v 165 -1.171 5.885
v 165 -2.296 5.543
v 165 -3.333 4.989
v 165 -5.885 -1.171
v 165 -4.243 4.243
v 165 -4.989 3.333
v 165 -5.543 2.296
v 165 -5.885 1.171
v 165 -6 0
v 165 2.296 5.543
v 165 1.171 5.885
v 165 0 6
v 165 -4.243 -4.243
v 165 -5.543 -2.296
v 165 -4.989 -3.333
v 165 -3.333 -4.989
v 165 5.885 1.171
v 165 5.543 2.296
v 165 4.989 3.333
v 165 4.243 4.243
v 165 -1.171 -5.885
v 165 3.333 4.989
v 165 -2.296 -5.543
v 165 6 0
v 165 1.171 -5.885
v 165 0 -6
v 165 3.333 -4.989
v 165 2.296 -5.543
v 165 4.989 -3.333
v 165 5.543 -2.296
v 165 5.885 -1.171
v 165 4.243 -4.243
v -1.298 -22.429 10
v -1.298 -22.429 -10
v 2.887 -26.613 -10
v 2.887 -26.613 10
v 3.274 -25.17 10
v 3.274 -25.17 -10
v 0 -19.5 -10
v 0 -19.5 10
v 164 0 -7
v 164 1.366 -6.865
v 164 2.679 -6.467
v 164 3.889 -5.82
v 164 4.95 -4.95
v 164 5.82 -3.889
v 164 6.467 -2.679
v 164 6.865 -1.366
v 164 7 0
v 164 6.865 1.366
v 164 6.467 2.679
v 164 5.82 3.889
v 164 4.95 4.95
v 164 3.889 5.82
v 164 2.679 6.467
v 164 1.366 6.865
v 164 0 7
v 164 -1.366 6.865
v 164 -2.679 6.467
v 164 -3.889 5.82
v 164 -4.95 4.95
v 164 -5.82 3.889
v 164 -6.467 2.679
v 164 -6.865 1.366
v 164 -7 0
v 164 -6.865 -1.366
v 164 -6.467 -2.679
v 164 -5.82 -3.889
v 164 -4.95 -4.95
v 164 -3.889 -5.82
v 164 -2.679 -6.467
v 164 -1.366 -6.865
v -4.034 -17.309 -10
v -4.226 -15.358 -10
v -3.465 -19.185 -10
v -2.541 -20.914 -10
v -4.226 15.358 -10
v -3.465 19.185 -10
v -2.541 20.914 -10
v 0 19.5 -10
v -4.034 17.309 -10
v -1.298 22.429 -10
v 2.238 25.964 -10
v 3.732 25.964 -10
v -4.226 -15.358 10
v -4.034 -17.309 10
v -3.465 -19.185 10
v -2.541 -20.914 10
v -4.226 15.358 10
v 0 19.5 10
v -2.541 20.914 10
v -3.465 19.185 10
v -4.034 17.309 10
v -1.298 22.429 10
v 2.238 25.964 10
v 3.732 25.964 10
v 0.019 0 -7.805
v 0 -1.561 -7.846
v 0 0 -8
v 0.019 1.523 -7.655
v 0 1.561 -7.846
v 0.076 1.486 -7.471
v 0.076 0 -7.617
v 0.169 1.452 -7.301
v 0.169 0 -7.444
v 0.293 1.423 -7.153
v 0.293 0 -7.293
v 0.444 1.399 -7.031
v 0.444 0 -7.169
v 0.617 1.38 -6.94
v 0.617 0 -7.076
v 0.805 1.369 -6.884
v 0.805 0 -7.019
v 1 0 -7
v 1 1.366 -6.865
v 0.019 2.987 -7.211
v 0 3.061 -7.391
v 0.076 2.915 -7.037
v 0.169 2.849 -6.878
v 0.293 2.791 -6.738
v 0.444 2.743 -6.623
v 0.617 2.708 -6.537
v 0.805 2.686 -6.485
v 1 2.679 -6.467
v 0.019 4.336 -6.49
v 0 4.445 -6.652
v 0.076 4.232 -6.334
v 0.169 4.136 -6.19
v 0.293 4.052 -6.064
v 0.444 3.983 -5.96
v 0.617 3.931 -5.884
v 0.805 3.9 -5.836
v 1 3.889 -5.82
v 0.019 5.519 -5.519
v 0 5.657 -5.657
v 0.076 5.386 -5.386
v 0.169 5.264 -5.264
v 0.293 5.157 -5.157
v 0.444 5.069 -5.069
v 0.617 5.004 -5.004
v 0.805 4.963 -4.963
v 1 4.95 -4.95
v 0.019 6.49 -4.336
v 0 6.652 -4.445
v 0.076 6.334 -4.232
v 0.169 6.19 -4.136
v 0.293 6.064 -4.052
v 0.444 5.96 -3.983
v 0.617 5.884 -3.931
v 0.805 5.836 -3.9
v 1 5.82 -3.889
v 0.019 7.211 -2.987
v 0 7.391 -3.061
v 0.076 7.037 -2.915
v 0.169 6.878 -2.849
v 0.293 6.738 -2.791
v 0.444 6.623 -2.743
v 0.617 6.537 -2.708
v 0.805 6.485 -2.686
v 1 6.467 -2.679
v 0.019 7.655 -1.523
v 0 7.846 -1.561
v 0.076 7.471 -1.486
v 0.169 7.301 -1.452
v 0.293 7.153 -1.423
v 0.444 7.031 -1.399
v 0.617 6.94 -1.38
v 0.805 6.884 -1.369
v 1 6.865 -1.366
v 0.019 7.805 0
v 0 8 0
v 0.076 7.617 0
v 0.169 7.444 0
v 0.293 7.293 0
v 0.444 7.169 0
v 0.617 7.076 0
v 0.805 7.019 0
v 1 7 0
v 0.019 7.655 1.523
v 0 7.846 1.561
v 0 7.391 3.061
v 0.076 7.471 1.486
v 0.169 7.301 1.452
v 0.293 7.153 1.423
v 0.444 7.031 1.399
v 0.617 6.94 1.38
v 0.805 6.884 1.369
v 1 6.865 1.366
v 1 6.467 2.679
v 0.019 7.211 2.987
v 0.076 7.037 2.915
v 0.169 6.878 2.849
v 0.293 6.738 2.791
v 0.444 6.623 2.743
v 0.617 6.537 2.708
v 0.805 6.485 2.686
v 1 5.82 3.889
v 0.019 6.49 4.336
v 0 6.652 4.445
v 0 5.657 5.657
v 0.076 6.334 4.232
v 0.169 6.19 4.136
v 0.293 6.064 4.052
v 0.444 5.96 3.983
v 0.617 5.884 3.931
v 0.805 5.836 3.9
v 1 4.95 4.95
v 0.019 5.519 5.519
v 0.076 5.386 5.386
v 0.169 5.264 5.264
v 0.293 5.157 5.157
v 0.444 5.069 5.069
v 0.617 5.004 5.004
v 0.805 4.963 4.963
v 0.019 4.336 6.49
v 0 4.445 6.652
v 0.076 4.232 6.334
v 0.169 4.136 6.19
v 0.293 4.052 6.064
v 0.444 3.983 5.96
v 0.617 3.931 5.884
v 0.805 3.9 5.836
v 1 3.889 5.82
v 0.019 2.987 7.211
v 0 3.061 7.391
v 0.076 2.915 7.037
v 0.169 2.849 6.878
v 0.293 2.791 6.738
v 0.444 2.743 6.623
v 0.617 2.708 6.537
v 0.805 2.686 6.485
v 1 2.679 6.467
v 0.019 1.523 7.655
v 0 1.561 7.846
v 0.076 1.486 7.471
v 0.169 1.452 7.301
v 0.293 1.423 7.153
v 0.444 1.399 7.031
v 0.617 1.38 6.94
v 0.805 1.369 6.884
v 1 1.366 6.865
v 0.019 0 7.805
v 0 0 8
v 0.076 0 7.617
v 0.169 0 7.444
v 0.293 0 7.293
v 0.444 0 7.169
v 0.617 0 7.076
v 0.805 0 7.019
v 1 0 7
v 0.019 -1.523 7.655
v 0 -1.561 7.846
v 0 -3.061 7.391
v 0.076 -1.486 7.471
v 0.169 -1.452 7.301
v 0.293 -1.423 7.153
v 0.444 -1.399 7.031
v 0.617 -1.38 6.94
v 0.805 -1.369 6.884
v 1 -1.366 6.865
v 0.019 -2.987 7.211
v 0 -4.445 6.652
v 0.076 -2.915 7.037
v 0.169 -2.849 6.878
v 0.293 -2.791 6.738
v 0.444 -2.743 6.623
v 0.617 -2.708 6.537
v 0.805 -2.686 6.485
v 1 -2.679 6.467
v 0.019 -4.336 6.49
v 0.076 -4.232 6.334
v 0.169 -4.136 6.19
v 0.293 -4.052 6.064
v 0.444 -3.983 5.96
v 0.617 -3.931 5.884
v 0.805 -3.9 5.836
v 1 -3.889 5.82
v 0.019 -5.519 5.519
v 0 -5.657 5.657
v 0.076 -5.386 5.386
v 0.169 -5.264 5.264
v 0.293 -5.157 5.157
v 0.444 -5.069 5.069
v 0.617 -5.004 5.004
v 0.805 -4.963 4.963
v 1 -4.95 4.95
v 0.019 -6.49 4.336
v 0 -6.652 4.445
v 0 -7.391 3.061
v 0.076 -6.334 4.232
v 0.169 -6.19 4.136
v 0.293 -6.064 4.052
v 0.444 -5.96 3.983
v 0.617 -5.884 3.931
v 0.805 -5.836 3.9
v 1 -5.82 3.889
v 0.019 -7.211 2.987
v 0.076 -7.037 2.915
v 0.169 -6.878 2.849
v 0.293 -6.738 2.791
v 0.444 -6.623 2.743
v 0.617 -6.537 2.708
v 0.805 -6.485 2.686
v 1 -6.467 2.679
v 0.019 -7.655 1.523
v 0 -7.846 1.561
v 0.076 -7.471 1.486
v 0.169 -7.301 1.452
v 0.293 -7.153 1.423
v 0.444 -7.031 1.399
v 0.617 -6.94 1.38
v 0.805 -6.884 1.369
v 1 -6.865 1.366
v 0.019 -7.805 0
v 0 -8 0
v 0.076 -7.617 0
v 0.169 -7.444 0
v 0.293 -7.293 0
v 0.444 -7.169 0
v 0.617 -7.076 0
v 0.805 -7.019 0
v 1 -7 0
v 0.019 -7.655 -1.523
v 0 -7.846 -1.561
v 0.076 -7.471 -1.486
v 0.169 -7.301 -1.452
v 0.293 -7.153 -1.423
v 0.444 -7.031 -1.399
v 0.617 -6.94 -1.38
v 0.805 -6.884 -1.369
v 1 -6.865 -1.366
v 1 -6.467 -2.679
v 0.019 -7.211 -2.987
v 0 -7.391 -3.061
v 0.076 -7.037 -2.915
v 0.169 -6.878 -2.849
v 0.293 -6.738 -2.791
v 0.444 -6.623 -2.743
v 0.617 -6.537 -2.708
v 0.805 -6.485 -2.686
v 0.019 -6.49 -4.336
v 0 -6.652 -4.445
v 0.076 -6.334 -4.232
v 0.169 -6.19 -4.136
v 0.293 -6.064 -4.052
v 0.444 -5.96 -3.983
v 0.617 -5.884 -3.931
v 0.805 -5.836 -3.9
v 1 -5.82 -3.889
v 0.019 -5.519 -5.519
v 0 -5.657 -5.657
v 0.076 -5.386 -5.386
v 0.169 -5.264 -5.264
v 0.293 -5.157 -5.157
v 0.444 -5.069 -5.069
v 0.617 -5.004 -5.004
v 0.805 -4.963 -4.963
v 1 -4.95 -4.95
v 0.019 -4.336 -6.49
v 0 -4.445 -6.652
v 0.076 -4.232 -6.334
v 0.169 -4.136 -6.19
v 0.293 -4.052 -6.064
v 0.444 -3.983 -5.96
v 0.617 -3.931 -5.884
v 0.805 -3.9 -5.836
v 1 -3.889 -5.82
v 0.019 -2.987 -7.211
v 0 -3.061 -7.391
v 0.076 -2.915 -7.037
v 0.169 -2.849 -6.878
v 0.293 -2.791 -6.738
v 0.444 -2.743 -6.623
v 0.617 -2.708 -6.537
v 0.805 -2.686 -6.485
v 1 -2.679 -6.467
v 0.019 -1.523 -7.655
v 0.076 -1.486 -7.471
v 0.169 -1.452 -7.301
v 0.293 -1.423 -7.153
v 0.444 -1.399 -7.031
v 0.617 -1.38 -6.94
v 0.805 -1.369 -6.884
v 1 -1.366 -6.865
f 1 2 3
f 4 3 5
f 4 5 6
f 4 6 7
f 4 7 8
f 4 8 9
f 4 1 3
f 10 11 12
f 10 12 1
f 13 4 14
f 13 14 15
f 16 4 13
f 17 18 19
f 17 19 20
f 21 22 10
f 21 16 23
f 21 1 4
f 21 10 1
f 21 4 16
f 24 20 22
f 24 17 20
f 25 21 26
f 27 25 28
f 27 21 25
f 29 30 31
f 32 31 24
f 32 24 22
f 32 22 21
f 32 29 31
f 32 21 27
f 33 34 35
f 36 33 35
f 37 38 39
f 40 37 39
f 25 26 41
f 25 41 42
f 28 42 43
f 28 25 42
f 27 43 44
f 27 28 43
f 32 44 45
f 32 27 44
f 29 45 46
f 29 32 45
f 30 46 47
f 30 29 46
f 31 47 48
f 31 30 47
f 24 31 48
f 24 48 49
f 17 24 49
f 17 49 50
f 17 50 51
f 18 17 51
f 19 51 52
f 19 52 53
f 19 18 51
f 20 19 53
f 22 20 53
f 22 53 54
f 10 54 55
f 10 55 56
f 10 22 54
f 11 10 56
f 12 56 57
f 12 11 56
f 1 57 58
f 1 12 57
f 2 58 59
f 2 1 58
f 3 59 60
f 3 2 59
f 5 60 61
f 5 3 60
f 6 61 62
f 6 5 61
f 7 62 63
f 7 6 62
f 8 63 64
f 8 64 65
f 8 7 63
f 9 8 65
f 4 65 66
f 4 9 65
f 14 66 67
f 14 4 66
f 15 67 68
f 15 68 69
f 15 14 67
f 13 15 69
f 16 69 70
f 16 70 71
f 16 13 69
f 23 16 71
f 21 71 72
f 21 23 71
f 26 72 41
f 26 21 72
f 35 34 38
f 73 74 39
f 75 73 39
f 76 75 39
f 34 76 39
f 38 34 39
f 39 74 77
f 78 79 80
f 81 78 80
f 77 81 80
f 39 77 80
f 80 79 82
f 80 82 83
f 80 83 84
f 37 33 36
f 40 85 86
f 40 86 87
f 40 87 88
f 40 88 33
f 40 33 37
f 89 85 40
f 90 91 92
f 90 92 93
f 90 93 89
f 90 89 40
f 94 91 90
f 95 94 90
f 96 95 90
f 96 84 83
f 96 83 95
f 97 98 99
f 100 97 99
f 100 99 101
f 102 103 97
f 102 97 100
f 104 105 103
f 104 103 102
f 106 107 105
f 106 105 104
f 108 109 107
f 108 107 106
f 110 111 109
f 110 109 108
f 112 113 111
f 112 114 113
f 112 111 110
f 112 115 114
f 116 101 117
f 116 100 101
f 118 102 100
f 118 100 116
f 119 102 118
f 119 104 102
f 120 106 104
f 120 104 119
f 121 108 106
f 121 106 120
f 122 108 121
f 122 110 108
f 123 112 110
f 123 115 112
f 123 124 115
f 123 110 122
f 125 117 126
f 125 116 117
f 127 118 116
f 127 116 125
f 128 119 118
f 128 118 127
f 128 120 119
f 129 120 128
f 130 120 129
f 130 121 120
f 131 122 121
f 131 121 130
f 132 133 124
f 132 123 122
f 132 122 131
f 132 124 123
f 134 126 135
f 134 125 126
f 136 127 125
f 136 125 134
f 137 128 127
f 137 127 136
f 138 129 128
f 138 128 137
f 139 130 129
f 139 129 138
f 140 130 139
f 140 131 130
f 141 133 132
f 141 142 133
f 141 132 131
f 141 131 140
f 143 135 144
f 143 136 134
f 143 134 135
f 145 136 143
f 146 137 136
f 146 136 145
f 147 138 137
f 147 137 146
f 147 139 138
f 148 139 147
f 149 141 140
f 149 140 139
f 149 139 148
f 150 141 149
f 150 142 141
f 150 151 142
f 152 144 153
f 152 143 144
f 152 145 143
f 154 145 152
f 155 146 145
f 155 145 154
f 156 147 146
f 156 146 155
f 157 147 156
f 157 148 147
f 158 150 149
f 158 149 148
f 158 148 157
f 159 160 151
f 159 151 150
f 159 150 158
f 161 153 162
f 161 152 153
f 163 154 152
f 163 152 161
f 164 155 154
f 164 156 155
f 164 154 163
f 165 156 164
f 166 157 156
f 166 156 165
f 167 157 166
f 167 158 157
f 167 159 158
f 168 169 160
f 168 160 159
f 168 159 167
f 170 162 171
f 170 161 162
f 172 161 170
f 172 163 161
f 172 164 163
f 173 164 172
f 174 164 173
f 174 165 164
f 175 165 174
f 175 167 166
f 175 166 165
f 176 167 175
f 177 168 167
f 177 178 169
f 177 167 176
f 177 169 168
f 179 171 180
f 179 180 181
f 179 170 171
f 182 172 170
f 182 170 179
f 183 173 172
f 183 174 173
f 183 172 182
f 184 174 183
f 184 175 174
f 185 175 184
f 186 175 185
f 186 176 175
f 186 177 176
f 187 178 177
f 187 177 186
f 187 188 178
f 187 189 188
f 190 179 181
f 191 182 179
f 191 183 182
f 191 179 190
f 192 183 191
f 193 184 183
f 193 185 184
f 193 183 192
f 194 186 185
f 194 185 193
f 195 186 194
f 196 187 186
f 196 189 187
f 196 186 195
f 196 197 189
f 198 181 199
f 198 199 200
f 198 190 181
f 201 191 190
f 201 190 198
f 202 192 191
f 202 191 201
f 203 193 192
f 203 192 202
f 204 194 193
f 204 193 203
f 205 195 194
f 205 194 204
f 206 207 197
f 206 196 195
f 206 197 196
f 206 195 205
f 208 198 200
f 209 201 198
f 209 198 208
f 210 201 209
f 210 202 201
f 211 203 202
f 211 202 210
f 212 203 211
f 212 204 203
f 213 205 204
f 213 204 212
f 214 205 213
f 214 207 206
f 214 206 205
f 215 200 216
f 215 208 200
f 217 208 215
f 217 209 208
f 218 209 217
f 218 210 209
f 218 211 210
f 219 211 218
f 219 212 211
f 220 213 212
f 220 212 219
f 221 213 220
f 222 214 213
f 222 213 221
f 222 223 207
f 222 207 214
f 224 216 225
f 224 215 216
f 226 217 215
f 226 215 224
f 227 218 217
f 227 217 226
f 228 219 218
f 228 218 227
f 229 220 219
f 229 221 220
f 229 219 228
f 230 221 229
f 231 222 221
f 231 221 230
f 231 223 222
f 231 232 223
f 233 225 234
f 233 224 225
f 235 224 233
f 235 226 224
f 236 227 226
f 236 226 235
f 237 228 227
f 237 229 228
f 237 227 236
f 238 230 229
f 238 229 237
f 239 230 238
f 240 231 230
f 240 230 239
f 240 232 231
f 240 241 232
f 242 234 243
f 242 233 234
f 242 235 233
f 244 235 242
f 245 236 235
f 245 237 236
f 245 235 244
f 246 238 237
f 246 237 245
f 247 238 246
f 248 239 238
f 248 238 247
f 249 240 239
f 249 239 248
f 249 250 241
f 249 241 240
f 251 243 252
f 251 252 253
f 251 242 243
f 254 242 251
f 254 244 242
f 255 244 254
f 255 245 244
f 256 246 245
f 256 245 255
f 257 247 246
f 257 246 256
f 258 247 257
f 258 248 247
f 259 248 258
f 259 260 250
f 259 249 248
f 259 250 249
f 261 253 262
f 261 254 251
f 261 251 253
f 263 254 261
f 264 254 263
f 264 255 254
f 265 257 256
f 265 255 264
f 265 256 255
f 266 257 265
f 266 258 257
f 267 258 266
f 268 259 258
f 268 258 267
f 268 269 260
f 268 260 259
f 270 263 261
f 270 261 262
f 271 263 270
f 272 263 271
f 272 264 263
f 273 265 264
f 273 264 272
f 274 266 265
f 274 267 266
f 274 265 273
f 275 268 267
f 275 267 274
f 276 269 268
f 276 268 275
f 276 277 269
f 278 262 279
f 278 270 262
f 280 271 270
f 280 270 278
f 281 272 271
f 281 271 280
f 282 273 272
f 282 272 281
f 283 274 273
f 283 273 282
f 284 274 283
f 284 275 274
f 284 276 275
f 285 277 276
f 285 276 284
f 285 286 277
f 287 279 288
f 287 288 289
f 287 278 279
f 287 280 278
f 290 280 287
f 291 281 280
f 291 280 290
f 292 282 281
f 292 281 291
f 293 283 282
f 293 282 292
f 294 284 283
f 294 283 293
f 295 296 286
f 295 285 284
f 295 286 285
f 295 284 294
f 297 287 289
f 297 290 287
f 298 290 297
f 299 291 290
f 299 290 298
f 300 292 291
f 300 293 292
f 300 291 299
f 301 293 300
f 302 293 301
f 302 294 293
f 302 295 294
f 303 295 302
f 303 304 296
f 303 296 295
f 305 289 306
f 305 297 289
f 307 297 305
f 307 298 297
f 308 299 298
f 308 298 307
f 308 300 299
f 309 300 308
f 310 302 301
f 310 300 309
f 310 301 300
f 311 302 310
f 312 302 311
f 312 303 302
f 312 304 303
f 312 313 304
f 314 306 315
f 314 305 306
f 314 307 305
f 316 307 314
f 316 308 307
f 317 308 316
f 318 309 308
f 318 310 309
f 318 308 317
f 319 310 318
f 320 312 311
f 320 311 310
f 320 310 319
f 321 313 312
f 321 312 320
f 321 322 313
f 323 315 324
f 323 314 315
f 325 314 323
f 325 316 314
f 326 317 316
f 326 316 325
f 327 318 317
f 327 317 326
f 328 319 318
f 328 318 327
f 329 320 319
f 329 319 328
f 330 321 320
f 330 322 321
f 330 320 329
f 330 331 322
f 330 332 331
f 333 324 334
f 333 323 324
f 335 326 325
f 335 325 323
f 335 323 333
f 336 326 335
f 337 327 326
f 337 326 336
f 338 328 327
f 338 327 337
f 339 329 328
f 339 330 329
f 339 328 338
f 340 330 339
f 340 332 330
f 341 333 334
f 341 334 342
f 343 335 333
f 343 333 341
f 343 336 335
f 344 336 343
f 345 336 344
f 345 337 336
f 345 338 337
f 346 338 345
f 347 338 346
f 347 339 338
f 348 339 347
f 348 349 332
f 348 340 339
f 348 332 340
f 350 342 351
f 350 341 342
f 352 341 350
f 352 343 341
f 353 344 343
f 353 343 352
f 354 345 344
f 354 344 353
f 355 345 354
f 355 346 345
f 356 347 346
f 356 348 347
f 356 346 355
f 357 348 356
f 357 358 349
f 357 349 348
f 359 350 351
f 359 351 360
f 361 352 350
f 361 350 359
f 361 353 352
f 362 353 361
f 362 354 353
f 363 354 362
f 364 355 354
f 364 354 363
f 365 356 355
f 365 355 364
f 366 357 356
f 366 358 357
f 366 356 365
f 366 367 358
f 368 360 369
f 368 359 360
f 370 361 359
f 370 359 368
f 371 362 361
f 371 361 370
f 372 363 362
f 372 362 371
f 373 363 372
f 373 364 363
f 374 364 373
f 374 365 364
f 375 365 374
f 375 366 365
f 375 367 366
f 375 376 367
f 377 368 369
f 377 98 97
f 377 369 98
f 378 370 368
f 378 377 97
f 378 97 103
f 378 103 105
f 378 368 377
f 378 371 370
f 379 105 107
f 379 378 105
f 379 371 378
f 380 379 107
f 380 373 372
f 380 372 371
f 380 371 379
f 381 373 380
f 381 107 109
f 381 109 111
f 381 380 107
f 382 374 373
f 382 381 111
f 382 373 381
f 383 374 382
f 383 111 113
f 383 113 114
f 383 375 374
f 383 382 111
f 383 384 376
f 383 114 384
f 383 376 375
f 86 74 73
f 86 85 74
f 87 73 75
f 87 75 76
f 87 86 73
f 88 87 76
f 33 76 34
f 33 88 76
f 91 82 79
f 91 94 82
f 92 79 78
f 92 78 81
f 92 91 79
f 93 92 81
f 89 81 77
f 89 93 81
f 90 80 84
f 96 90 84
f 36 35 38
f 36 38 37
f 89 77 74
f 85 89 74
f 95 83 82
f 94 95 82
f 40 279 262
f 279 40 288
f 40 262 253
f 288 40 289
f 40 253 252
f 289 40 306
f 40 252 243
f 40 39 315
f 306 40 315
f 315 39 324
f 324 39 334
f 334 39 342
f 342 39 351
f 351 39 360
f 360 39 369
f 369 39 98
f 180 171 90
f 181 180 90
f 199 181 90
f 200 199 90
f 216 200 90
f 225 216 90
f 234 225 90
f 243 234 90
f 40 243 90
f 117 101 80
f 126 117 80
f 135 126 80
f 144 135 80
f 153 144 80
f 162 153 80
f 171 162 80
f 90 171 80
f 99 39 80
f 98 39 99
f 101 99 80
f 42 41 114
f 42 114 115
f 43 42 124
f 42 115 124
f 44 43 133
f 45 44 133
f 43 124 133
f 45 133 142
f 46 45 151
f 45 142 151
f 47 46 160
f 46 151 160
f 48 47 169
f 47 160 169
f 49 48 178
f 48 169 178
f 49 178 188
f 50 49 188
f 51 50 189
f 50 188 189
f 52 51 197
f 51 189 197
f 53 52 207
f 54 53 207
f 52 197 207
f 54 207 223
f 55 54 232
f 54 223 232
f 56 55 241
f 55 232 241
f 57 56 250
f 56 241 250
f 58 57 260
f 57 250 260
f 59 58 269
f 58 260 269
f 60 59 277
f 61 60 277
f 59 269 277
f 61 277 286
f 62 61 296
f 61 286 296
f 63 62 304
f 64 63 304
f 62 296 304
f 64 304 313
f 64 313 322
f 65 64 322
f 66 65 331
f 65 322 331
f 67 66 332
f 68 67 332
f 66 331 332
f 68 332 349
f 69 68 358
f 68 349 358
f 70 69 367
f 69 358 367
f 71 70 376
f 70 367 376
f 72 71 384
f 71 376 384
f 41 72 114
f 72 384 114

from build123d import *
from OCP.BRepFilletAPI import BRepFilletAPI_MakeChamfer

# Parameters (mm, degrees)
SZKIC1_R                         = 7
DODANIE_WYCI_GNI_CIE1_DEPTH      = 165
DODANIE_WYCI_GNI_CIE2_DEPTH      = 10
DODANIE_WYCI_GNI_CIE2_DEPTH_BACK = 10
SFAZOWANIE1_SIZE                 = 5
SFAZOWANIE1_SIZE2                = 4.082482905
SFAZOWANIE2_SIZE                 = 1
ZAOKR_GLENIE1_R                  = 10
ZAOKR_GLENIE2_R                  = 1


with BuildPart() as part:
    # Szkic1 → Dodanie-wyciągnięcie1 (new body)
    with BuildSketch(Plane(origin=(0, 0, 0), x_dir=(0, 0, -1), z_dir=(1, 0, 0))):
        Circle(SZKIC1_R)
    extrude(amount=DODANIE_WYCI_GNI_CIE1_DEPTH)

    # Szkic2 → Dodanie-wyciągnięcie2 (add, two sides: drawn at the far end of the back side and taken through both)
    with BuildSketch(Plane.XY.offset(-DODANIE_WYCI_GNI_CIE2_DEPTH_BACK)):
        Polygon((0, 0), (0, 19.5), (5.773502692, 29.5), (-4.226497308, 19.5), (-4.226497308, -19.5), (5.773502692, -29.5), (0, -19.5), align=None)
    extrude(amount=DODANIE_WYCI_GNI_CIE2_DEPTH + DODANIE_WYCI_GNI_CIE2_DEPTH_BACK)

    # Sfazowanie1: one chamfer whose edges measure the first distance from different faces: ONE call of the kernel's chamfer builder (chamfer() names one face for all edges)
    sfazowanie1_edges_1 = [part.edges().sort_by_distance(p)[0] for p in [
        (5.773502692, -29.5, 0),
    ]]
    sfazowanie1_side_1 = [part.faces().sort_by_distance(p)[0] for p in [
        (2.886751346, -24.5, 0),
    ]]
    sfazowanie1_edges_2 = [part.edges().sort_by_distance(p)[0] for p in [
        (5.773502692, 29.5, 0),
    ]]
    sfazowanie1_side_2 = [part.faces().sort_by_distance(p)[0] for p in [
        (0.773502692, 24.5, 0),
    ]]
    sfazowanie1 = BRepFilletAPI_MakeChamfer(part.part.solid().wrapped)
    for e in sfazowanie1_edges_1:
        sfazowanie1.Add(SFAZOWANIE1_SIZE, SFAZOWANIE1_SIZE2, e.wrapped, sfazowanie1_side_1[0].wrapped)  # the first distance lies on this face
    for e in sfazowanie1_edges_2:
        sfazowanie1.Add(SFAZOWANIE1_SIZE, SFAZOWANIE1_SIZE2, e.wrapped, sfazowanie1_side_2[0].wrapped)  # the first distance lies on this face
    add(Compound.cast(sfazowanie1.Shape()), mode=Mode.REPLACE)

    # Sfazowanie2
    sfazowanie2_edges = [part.edges().sort_by_distance(p)[0] for p in [
        (165, 0, 7),
    ]]
    chamfer(sfazowanie2_edges, length=SFAZOWANIE2_SIZE)

    # Zaokrąglenie1
    zaokr_glenie1_edges = [part.edges().sort_by_distance(p)[0] for p in [
        (-4.226497308, -19.5, 0),
        (-4.226497308, 19.5, 0),
    ]]
    fillet(zaokr_glenie1_edges, radius=ZAOKR_GLENIE1_R)

    # Zaokrąglenie2
    zaokr_glenie2_edges = [part.edges().sort_by_distance(p)[0] for p in [
        (0, 0, 7),
    ]]
    fillet(zaokr_glenie2_edges, radius=ZAOKR_GLENIE2_R)


solid = part.part
